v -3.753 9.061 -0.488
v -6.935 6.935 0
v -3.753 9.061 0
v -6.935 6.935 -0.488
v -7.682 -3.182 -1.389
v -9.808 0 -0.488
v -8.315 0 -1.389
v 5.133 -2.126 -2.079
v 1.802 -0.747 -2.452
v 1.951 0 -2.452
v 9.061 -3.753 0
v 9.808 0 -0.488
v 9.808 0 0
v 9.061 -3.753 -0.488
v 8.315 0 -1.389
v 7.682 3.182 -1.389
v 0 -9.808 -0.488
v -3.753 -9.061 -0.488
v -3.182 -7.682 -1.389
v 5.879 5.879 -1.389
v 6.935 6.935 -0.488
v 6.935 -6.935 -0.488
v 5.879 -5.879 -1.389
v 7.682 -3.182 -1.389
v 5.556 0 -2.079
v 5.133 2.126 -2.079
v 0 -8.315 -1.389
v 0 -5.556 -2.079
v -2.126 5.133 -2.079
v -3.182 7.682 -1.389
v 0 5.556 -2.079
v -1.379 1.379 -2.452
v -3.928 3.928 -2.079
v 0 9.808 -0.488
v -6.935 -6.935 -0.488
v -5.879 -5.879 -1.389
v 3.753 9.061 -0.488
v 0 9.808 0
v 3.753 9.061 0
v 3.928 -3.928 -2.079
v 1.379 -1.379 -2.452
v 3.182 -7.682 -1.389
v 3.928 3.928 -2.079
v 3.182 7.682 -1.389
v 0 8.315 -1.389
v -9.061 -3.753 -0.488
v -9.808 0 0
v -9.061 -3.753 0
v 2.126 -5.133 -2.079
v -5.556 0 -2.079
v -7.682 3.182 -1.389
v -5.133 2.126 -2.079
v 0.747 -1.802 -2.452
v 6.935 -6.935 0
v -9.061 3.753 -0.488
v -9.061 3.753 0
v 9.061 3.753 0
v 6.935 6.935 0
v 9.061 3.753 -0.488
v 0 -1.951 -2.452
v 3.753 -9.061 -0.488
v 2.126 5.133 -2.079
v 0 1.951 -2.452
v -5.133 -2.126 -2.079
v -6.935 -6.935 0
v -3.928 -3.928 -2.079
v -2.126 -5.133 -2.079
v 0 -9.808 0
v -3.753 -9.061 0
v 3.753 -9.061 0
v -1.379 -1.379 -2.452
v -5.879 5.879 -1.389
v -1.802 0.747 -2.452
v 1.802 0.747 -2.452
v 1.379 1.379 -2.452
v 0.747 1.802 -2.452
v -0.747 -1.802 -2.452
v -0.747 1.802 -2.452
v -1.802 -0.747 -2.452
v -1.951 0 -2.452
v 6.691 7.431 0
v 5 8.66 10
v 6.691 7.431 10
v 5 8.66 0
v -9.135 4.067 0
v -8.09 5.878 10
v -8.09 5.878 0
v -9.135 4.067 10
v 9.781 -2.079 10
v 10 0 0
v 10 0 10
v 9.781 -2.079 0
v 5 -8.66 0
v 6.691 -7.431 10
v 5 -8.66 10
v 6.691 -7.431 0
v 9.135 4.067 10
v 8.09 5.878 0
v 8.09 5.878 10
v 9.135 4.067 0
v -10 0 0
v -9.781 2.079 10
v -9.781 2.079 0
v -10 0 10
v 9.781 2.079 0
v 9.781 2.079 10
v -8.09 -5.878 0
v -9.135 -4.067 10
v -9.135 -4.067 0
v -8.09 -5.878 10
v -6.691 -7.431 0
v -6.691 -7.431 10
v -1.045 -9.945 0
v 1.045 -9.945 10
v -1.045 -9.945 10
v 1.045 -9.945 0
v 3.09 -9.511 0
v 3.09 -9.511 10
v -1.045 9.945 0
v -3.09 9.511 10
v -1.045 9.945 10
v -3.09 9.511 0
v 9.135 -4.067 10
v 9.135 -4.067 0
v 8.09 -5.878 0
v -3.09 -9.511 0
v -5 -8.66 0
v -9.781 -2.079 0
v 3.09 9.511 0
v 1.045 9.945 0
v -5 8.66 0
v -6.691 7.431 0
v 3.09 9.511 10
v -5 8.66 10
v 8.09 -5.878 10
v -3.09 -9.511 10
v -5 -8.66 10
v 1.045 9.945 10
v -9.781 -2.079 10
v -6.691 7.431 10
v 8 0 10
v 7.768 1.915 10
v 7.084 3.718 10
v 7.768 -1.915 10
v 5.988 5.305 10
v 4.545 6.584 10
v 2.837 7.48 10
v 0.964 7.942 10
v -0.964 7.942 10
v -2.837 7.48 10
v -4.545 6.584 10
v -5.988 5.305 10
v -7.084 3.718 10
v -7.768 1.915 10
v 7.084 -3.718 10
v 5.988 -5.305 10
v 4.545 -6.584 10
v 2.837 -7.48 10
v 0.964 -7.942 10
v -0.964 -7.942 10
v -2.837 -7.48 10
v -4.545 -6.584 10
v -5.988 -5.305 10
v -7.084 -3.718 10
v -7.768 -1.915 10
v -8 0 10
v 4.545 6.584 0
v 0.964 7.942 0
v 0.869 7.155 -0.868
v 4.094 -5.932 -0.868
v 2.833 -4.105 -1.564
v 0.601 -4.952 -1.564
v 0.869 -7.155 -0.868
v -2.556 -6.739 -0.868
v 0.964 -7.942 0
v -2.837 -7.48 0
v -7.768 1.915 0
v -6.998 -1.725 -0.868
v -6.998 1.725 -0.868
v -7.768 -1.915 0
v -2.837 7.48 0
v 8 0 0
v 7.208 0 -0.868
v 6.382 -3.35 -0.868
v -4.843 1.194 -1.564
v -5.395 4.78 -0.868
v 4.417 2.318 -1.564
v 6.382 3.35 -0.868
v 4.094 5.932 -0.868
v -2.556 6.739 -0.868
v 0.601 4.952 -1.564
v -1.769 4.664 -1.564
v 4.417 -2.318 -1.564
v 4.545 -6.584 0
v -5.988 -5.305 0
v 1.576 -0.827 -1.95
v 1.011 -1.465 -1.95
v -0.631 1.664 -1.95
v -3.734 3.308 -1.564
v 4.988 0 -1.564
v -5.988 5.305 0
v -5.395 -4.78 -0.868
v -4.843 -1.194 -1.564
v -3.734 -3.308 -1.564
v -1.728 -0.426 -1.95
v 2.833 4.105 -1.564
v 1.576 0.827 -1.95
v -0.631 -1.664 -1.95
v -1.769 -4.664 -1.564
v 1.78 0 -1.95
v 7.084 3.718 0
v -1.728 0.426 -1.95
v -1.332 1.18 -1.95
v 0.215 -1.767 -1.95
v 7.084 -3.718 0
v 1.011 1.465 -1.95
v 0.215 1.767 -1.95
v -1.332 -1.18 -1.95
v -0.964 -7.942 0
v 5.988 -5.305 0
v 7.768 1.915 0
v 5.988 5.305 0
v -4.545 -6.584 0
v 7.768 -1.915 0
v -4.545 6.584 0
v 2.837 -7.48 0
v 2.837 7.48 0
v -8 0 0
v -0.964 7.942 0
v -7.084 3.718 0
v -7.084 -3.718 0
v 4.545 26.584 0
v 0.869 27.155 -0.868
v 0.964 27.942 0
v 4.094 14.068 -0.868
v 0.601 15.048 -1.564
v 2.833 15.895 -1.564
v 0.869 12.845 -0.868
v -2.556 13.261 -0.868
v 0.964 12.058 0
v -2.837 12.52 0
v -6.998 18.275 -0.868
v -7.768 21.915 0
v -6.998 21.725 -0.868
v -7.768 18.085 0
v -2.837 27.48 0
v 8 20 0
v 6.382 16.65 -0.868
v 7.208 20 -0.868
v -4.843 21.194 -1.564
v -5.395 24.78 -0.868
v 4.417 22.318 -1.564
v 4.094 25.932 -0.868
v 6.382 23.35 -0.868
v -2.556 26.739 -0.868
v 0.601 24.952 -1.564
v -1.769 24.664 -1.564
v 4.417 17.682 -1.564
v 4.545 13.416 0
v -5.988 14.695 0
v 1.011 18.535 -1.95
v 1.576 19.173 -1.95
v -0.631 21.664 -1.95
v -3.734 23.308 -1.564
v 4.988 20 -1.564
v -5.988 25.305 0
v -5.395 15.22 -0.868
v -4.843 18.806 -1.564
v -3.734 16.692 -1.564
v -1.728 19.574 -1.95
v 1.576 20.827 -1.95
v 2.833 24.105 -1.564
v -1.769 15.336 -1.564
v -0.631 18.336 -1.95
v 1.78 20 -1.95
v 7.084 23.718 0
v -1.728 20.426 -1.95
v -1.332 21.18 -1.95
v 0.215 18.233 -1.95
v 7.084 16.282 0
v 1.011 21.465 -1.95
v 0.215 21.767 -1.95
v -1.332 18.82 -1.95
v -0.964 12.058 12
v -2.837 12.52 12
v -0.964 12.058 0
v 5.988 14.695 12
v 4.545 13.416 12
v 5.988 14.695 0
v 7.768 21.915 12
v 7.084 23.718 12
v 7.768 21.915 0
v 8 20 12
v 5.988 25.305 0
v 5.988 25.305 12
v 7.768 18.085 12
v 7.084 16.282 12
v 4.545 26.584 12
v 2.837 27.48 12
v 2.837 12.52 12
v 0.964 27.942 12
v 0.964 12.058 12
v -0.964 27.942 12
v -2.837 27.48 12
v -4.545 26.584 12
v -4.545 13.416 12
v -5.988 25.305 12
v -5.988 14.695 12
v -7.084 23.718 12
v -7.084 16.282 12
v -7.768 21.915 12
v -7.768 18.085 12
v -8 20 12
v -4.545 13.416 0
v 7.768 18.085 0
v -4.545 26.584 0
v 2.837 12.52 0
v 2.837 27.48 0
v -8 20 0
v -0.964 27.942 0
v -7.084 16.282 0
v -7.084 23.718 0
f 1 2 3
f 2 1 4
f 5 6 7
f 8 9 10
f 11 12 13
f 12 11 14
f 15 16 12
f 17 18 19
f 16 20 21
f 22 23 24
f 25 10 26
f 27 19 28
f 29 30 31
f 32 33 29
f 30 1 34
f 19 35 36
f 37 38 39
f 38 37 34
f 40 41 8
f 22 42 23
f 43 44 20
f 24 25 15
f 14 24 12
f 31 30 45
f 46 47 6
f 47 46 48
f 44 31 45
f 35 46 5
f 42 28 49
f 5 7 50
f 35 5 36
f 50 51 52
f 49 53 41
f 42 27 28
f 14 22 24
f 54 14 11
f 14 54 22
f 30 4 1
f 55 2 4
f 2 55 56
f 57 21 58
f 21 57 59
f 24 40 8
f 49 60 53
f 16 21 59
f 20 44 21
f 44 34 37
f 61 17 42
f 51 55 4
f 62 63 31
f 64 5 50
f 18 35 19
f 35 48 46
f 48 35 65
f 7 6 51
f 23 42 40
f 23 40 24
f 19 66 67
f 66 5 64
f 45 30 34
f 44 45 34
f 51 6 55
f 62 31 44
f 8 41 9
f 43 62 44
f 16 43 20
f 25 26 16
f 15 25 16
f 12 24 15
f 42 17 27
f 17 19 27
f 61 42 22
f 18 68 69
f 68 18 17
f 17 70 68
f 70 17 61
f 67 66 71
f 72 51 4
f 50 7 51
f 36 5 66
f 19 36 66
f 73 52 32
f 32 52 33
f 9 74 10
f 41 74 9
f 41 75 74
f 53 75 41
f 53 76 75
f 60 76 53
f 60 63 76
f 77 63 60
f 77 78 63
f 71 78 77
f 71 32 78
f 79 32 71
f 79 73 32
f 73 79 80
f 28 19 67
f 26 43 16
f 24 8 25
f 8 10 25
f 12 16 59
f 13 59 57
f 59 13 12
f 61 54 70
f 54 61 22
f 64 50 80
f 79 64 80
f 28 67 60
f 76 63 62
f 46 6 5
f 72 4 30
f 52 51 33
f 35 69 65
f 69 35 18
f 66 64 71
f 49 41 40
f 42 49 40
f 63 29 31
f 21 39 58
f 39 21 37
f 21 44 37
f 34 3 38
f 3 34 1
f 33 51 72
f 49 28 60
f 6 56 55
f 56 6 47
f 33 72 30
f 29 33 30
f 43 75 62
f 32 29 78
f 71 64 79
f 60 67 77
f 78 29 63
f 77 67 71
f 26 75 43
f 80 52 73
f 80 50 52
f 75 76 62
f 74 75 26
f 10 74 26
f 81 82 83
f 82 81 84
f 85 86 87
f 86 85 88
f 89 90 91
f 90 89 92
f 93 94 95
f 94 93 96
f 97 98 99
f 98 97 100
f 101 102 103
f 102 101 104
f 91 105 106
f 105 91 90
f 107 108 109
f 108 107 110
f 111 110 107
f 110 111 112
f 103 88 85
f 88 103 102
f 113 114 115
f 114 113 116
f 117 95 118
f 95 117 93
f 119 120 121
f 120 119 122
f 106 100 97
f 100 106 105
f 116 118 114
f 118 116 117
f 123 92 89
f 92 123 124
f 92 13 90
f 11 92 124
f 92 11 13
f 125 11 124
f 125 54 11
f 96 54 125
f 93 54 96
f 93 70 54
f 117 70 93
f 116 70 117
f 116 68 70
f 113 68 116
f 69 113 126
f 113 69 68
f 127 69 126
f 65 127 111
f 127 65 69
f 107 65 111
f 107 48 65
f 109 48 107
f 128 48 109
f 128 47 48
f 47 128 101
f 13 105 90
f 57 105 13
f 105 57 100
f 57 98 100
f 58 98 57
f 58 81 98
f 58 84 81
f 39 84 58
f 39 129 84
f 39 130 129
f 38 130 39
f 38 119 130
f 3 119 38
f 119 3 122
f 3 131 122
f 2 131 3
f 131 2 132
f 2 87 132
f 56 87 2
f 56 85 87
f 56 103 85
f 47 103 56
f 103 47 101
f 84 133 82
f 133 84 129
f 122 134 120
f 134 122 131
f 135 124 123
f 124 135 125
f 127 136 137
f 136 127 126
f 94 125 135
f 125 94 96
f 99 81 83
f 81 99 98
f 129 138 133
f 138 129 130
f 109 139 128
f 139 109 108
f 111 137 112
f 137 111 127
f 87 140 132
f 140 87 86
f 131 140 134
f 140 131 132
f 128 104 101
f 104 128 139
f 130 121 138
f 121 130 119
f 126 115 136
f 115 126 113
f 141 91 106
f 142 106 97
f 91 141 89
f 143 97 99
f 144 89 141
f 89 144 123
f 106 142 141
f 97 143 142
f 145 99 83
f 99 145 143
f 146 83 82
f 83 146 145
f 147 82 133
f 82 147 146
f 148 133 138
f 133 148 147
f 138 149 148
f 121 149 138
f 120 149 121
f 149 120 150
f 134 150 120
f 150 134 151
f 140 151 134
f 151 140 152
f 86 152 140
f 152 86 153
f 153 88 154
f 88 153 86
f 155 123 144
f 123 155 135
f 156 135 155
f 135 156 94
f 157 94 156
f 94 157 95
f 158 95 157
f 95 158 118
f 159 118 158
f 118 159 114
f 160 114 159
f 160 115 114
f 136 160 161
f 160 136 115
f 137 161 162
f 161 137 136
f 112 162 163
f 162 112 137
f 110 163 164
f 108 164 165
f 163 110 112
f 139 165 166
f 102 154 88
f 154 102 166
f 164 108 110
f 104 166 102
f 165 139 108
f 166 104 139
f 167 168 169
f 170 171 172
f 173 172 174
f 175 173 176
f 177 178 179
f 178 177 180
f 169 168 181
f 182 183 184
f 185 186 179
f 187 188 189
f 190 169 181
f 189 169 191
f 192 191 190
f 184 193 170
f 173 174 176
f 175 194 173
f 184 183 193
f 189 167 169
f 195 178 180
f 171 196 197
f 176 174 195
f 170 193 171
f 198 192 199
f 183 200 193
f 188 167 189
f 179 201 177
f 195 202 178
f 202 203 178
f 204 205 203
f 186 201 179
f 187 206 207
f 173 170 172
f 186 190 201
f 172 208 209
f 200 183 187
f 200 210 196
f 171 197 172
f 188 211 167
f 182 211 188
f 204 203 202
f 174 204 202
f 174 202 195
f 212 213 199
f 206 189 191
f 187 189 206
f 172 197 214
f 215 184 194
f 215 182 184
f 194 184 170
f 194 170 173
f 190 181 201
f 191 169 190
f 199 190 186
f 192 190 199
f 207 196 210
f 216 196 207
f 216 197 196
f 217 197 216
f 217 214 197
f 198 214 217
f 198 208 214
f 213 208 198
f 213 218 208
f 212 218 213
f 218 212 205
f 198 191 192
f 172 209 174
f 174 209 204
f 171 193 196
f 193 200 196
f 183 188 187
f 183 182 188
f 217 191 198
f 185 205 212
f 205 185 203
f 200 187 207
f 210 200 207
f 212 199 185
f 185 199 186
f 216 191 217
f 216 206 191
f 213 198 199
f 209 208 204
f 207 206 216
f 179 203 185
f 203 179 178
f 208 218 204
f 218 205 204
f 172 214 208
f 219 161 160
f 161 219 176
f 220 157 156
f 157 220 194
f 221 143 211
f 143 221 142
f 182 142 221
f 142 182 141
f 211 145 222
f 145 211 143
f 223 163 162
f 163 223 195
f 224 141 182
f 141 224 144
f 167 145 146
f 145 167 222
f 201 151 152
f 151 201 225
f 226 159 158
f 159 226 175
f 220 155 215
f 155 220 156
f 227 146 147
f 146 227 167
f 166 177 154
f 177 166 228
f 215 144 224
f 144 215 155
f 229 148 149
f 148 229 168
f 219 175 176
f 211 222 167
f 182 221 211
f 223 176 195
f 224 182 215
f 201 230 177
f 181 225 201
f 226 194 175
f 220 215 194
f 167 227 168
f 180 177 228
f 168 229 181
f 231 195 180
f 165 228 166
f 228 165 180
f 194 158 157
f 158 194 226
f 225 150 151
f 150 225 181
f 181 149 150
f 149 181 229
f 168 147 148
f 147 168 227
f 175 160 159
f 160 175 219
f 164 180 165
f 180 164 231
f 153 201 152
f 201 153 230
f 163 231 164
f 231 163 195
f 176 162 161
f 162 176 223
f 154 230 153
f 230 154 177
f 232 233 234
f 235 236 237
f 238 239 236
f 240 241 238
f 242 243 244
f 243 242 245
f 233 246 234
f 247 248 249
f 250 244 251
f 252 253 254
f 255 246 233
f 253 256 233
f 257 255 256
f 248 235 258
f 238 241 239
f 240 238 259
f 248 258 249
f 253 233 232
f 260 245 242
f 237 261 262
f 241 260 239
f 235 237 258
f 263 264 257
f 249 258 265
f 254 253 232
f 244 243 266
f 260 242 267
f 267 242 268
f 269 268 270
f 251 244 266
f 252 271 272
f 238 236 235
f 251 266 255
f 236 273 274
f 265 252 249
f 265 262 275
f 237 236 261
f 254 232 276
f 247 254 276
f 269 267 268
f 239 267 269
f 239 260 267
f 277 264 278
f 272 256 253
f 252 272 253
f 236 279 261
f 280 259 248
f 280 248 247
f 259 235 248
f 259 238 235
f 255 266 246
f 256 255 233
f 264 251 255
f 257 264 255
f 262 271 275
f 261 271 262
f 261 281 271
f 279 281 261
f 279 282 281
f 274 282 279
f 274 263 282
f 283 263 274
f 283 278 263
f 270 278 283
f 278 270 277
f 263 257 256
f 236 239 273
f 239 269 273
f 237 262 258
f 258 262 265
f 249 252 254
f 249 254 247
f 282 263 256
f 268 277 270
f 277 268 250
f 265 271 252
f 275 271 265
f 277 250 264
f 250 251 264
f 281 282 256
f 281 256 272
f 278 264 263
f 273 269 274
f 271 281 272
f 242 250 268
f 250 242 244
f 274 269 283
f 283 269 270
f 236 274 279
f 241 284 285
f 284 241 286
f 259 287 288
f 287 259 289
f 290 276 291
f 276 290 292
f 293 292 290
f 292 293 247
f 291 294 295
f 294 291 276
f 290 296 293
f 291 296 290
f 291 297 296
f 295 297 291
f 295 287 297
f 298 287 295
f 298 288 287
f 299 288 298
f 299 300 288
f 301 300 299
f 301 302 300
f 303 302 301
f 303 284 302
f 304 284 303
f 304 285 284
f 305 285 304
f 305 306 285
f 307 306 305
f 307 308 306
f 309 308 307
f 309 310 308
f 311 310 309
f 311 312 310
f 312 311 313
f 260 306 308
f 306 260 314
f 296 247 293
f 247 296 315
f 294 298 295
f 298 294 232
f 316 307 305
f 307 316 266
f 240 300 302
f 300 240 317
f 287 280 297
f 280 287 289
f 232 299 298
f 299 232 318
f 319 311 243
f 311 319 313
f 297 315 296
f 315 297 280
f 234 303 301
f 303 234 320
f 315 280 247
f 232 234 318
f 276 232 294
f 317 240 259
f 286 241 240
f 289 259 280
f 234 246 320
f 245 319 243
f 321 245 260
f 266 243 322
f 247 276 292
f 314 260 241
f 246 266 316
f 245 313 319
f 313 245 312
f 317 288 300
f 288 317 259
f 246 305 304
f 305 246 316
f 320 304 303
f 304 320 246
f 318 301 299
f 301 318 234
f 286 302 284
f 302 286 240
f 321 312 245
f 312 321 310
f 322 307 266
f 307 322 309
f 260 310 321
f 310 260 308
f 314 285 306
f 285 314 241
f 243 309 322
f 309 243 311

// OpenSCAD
// Copyright Cledden Obeng-Poku Kwanin and Robert L. Read, 2024
// Released under CERN Strong-reciprocal Open Hardware License

// This is an attempt to make a new parametrized experimental apparatus
// for teting our ferrofluid check valve. It will be similar to the system
// that Veronica design in SolidWorks, but will use the improved, 360 degree design


pot_height = 10;
wall_thickness =1;
outer_rad =5;
inner_rad = 4;
base_scale_factor = 2;
height_scale_factor = 0.5;


// ptype = "flatbottom";
ptype = "roundbottom";



module renderPotType(ptype) {
if (ptype == "flatbottom") {
    translate([0,20,0])
    union () {
        scale ([base_scale_factor,base_scale_factor,height_scale_factor])
        sphere (r = inner_rad);

        cylinder (h=pot_height+2,r1 =2*inner_rad, r2 =2*inner_rad);
    }
} else if (ptype == "roundbottom") {
    difference() {    
        union () {
            scale ([base_scale_factor,base_scale_factor,height_scale_factor])
            color ("red")
            sphere (outer_rad);
            color("blue")
            cylinder (h=pot_height,r=2*outer_rad,r2=2*outer_rad);
        }
        union () {
            scale ([base_scale_factor,base_scale_factor,height_scale_factor])
            sphere (r = inner_rad);
            cylinder (h=(pot_height*2),r =2*inner_rad, r2= 2*inner_rad);
        }
    }
} 
}

renderPotType("roundbottom");
renderPotType("flatbottom");

//difference () {
//cylinder (9,4,4);
//translate([0,0,1])cylinder (10,3,3);
//}
//difference () {
//translate ([0,10,4])
//sphere(4);
//translate ([0,10,6])
//sphere(3);
//}
//difference () {
//translate ([0,10,4])
//cylinder (5,4,4);
//translate ([0,10,5])
//cylinder (5,3,3);
//    
//}
